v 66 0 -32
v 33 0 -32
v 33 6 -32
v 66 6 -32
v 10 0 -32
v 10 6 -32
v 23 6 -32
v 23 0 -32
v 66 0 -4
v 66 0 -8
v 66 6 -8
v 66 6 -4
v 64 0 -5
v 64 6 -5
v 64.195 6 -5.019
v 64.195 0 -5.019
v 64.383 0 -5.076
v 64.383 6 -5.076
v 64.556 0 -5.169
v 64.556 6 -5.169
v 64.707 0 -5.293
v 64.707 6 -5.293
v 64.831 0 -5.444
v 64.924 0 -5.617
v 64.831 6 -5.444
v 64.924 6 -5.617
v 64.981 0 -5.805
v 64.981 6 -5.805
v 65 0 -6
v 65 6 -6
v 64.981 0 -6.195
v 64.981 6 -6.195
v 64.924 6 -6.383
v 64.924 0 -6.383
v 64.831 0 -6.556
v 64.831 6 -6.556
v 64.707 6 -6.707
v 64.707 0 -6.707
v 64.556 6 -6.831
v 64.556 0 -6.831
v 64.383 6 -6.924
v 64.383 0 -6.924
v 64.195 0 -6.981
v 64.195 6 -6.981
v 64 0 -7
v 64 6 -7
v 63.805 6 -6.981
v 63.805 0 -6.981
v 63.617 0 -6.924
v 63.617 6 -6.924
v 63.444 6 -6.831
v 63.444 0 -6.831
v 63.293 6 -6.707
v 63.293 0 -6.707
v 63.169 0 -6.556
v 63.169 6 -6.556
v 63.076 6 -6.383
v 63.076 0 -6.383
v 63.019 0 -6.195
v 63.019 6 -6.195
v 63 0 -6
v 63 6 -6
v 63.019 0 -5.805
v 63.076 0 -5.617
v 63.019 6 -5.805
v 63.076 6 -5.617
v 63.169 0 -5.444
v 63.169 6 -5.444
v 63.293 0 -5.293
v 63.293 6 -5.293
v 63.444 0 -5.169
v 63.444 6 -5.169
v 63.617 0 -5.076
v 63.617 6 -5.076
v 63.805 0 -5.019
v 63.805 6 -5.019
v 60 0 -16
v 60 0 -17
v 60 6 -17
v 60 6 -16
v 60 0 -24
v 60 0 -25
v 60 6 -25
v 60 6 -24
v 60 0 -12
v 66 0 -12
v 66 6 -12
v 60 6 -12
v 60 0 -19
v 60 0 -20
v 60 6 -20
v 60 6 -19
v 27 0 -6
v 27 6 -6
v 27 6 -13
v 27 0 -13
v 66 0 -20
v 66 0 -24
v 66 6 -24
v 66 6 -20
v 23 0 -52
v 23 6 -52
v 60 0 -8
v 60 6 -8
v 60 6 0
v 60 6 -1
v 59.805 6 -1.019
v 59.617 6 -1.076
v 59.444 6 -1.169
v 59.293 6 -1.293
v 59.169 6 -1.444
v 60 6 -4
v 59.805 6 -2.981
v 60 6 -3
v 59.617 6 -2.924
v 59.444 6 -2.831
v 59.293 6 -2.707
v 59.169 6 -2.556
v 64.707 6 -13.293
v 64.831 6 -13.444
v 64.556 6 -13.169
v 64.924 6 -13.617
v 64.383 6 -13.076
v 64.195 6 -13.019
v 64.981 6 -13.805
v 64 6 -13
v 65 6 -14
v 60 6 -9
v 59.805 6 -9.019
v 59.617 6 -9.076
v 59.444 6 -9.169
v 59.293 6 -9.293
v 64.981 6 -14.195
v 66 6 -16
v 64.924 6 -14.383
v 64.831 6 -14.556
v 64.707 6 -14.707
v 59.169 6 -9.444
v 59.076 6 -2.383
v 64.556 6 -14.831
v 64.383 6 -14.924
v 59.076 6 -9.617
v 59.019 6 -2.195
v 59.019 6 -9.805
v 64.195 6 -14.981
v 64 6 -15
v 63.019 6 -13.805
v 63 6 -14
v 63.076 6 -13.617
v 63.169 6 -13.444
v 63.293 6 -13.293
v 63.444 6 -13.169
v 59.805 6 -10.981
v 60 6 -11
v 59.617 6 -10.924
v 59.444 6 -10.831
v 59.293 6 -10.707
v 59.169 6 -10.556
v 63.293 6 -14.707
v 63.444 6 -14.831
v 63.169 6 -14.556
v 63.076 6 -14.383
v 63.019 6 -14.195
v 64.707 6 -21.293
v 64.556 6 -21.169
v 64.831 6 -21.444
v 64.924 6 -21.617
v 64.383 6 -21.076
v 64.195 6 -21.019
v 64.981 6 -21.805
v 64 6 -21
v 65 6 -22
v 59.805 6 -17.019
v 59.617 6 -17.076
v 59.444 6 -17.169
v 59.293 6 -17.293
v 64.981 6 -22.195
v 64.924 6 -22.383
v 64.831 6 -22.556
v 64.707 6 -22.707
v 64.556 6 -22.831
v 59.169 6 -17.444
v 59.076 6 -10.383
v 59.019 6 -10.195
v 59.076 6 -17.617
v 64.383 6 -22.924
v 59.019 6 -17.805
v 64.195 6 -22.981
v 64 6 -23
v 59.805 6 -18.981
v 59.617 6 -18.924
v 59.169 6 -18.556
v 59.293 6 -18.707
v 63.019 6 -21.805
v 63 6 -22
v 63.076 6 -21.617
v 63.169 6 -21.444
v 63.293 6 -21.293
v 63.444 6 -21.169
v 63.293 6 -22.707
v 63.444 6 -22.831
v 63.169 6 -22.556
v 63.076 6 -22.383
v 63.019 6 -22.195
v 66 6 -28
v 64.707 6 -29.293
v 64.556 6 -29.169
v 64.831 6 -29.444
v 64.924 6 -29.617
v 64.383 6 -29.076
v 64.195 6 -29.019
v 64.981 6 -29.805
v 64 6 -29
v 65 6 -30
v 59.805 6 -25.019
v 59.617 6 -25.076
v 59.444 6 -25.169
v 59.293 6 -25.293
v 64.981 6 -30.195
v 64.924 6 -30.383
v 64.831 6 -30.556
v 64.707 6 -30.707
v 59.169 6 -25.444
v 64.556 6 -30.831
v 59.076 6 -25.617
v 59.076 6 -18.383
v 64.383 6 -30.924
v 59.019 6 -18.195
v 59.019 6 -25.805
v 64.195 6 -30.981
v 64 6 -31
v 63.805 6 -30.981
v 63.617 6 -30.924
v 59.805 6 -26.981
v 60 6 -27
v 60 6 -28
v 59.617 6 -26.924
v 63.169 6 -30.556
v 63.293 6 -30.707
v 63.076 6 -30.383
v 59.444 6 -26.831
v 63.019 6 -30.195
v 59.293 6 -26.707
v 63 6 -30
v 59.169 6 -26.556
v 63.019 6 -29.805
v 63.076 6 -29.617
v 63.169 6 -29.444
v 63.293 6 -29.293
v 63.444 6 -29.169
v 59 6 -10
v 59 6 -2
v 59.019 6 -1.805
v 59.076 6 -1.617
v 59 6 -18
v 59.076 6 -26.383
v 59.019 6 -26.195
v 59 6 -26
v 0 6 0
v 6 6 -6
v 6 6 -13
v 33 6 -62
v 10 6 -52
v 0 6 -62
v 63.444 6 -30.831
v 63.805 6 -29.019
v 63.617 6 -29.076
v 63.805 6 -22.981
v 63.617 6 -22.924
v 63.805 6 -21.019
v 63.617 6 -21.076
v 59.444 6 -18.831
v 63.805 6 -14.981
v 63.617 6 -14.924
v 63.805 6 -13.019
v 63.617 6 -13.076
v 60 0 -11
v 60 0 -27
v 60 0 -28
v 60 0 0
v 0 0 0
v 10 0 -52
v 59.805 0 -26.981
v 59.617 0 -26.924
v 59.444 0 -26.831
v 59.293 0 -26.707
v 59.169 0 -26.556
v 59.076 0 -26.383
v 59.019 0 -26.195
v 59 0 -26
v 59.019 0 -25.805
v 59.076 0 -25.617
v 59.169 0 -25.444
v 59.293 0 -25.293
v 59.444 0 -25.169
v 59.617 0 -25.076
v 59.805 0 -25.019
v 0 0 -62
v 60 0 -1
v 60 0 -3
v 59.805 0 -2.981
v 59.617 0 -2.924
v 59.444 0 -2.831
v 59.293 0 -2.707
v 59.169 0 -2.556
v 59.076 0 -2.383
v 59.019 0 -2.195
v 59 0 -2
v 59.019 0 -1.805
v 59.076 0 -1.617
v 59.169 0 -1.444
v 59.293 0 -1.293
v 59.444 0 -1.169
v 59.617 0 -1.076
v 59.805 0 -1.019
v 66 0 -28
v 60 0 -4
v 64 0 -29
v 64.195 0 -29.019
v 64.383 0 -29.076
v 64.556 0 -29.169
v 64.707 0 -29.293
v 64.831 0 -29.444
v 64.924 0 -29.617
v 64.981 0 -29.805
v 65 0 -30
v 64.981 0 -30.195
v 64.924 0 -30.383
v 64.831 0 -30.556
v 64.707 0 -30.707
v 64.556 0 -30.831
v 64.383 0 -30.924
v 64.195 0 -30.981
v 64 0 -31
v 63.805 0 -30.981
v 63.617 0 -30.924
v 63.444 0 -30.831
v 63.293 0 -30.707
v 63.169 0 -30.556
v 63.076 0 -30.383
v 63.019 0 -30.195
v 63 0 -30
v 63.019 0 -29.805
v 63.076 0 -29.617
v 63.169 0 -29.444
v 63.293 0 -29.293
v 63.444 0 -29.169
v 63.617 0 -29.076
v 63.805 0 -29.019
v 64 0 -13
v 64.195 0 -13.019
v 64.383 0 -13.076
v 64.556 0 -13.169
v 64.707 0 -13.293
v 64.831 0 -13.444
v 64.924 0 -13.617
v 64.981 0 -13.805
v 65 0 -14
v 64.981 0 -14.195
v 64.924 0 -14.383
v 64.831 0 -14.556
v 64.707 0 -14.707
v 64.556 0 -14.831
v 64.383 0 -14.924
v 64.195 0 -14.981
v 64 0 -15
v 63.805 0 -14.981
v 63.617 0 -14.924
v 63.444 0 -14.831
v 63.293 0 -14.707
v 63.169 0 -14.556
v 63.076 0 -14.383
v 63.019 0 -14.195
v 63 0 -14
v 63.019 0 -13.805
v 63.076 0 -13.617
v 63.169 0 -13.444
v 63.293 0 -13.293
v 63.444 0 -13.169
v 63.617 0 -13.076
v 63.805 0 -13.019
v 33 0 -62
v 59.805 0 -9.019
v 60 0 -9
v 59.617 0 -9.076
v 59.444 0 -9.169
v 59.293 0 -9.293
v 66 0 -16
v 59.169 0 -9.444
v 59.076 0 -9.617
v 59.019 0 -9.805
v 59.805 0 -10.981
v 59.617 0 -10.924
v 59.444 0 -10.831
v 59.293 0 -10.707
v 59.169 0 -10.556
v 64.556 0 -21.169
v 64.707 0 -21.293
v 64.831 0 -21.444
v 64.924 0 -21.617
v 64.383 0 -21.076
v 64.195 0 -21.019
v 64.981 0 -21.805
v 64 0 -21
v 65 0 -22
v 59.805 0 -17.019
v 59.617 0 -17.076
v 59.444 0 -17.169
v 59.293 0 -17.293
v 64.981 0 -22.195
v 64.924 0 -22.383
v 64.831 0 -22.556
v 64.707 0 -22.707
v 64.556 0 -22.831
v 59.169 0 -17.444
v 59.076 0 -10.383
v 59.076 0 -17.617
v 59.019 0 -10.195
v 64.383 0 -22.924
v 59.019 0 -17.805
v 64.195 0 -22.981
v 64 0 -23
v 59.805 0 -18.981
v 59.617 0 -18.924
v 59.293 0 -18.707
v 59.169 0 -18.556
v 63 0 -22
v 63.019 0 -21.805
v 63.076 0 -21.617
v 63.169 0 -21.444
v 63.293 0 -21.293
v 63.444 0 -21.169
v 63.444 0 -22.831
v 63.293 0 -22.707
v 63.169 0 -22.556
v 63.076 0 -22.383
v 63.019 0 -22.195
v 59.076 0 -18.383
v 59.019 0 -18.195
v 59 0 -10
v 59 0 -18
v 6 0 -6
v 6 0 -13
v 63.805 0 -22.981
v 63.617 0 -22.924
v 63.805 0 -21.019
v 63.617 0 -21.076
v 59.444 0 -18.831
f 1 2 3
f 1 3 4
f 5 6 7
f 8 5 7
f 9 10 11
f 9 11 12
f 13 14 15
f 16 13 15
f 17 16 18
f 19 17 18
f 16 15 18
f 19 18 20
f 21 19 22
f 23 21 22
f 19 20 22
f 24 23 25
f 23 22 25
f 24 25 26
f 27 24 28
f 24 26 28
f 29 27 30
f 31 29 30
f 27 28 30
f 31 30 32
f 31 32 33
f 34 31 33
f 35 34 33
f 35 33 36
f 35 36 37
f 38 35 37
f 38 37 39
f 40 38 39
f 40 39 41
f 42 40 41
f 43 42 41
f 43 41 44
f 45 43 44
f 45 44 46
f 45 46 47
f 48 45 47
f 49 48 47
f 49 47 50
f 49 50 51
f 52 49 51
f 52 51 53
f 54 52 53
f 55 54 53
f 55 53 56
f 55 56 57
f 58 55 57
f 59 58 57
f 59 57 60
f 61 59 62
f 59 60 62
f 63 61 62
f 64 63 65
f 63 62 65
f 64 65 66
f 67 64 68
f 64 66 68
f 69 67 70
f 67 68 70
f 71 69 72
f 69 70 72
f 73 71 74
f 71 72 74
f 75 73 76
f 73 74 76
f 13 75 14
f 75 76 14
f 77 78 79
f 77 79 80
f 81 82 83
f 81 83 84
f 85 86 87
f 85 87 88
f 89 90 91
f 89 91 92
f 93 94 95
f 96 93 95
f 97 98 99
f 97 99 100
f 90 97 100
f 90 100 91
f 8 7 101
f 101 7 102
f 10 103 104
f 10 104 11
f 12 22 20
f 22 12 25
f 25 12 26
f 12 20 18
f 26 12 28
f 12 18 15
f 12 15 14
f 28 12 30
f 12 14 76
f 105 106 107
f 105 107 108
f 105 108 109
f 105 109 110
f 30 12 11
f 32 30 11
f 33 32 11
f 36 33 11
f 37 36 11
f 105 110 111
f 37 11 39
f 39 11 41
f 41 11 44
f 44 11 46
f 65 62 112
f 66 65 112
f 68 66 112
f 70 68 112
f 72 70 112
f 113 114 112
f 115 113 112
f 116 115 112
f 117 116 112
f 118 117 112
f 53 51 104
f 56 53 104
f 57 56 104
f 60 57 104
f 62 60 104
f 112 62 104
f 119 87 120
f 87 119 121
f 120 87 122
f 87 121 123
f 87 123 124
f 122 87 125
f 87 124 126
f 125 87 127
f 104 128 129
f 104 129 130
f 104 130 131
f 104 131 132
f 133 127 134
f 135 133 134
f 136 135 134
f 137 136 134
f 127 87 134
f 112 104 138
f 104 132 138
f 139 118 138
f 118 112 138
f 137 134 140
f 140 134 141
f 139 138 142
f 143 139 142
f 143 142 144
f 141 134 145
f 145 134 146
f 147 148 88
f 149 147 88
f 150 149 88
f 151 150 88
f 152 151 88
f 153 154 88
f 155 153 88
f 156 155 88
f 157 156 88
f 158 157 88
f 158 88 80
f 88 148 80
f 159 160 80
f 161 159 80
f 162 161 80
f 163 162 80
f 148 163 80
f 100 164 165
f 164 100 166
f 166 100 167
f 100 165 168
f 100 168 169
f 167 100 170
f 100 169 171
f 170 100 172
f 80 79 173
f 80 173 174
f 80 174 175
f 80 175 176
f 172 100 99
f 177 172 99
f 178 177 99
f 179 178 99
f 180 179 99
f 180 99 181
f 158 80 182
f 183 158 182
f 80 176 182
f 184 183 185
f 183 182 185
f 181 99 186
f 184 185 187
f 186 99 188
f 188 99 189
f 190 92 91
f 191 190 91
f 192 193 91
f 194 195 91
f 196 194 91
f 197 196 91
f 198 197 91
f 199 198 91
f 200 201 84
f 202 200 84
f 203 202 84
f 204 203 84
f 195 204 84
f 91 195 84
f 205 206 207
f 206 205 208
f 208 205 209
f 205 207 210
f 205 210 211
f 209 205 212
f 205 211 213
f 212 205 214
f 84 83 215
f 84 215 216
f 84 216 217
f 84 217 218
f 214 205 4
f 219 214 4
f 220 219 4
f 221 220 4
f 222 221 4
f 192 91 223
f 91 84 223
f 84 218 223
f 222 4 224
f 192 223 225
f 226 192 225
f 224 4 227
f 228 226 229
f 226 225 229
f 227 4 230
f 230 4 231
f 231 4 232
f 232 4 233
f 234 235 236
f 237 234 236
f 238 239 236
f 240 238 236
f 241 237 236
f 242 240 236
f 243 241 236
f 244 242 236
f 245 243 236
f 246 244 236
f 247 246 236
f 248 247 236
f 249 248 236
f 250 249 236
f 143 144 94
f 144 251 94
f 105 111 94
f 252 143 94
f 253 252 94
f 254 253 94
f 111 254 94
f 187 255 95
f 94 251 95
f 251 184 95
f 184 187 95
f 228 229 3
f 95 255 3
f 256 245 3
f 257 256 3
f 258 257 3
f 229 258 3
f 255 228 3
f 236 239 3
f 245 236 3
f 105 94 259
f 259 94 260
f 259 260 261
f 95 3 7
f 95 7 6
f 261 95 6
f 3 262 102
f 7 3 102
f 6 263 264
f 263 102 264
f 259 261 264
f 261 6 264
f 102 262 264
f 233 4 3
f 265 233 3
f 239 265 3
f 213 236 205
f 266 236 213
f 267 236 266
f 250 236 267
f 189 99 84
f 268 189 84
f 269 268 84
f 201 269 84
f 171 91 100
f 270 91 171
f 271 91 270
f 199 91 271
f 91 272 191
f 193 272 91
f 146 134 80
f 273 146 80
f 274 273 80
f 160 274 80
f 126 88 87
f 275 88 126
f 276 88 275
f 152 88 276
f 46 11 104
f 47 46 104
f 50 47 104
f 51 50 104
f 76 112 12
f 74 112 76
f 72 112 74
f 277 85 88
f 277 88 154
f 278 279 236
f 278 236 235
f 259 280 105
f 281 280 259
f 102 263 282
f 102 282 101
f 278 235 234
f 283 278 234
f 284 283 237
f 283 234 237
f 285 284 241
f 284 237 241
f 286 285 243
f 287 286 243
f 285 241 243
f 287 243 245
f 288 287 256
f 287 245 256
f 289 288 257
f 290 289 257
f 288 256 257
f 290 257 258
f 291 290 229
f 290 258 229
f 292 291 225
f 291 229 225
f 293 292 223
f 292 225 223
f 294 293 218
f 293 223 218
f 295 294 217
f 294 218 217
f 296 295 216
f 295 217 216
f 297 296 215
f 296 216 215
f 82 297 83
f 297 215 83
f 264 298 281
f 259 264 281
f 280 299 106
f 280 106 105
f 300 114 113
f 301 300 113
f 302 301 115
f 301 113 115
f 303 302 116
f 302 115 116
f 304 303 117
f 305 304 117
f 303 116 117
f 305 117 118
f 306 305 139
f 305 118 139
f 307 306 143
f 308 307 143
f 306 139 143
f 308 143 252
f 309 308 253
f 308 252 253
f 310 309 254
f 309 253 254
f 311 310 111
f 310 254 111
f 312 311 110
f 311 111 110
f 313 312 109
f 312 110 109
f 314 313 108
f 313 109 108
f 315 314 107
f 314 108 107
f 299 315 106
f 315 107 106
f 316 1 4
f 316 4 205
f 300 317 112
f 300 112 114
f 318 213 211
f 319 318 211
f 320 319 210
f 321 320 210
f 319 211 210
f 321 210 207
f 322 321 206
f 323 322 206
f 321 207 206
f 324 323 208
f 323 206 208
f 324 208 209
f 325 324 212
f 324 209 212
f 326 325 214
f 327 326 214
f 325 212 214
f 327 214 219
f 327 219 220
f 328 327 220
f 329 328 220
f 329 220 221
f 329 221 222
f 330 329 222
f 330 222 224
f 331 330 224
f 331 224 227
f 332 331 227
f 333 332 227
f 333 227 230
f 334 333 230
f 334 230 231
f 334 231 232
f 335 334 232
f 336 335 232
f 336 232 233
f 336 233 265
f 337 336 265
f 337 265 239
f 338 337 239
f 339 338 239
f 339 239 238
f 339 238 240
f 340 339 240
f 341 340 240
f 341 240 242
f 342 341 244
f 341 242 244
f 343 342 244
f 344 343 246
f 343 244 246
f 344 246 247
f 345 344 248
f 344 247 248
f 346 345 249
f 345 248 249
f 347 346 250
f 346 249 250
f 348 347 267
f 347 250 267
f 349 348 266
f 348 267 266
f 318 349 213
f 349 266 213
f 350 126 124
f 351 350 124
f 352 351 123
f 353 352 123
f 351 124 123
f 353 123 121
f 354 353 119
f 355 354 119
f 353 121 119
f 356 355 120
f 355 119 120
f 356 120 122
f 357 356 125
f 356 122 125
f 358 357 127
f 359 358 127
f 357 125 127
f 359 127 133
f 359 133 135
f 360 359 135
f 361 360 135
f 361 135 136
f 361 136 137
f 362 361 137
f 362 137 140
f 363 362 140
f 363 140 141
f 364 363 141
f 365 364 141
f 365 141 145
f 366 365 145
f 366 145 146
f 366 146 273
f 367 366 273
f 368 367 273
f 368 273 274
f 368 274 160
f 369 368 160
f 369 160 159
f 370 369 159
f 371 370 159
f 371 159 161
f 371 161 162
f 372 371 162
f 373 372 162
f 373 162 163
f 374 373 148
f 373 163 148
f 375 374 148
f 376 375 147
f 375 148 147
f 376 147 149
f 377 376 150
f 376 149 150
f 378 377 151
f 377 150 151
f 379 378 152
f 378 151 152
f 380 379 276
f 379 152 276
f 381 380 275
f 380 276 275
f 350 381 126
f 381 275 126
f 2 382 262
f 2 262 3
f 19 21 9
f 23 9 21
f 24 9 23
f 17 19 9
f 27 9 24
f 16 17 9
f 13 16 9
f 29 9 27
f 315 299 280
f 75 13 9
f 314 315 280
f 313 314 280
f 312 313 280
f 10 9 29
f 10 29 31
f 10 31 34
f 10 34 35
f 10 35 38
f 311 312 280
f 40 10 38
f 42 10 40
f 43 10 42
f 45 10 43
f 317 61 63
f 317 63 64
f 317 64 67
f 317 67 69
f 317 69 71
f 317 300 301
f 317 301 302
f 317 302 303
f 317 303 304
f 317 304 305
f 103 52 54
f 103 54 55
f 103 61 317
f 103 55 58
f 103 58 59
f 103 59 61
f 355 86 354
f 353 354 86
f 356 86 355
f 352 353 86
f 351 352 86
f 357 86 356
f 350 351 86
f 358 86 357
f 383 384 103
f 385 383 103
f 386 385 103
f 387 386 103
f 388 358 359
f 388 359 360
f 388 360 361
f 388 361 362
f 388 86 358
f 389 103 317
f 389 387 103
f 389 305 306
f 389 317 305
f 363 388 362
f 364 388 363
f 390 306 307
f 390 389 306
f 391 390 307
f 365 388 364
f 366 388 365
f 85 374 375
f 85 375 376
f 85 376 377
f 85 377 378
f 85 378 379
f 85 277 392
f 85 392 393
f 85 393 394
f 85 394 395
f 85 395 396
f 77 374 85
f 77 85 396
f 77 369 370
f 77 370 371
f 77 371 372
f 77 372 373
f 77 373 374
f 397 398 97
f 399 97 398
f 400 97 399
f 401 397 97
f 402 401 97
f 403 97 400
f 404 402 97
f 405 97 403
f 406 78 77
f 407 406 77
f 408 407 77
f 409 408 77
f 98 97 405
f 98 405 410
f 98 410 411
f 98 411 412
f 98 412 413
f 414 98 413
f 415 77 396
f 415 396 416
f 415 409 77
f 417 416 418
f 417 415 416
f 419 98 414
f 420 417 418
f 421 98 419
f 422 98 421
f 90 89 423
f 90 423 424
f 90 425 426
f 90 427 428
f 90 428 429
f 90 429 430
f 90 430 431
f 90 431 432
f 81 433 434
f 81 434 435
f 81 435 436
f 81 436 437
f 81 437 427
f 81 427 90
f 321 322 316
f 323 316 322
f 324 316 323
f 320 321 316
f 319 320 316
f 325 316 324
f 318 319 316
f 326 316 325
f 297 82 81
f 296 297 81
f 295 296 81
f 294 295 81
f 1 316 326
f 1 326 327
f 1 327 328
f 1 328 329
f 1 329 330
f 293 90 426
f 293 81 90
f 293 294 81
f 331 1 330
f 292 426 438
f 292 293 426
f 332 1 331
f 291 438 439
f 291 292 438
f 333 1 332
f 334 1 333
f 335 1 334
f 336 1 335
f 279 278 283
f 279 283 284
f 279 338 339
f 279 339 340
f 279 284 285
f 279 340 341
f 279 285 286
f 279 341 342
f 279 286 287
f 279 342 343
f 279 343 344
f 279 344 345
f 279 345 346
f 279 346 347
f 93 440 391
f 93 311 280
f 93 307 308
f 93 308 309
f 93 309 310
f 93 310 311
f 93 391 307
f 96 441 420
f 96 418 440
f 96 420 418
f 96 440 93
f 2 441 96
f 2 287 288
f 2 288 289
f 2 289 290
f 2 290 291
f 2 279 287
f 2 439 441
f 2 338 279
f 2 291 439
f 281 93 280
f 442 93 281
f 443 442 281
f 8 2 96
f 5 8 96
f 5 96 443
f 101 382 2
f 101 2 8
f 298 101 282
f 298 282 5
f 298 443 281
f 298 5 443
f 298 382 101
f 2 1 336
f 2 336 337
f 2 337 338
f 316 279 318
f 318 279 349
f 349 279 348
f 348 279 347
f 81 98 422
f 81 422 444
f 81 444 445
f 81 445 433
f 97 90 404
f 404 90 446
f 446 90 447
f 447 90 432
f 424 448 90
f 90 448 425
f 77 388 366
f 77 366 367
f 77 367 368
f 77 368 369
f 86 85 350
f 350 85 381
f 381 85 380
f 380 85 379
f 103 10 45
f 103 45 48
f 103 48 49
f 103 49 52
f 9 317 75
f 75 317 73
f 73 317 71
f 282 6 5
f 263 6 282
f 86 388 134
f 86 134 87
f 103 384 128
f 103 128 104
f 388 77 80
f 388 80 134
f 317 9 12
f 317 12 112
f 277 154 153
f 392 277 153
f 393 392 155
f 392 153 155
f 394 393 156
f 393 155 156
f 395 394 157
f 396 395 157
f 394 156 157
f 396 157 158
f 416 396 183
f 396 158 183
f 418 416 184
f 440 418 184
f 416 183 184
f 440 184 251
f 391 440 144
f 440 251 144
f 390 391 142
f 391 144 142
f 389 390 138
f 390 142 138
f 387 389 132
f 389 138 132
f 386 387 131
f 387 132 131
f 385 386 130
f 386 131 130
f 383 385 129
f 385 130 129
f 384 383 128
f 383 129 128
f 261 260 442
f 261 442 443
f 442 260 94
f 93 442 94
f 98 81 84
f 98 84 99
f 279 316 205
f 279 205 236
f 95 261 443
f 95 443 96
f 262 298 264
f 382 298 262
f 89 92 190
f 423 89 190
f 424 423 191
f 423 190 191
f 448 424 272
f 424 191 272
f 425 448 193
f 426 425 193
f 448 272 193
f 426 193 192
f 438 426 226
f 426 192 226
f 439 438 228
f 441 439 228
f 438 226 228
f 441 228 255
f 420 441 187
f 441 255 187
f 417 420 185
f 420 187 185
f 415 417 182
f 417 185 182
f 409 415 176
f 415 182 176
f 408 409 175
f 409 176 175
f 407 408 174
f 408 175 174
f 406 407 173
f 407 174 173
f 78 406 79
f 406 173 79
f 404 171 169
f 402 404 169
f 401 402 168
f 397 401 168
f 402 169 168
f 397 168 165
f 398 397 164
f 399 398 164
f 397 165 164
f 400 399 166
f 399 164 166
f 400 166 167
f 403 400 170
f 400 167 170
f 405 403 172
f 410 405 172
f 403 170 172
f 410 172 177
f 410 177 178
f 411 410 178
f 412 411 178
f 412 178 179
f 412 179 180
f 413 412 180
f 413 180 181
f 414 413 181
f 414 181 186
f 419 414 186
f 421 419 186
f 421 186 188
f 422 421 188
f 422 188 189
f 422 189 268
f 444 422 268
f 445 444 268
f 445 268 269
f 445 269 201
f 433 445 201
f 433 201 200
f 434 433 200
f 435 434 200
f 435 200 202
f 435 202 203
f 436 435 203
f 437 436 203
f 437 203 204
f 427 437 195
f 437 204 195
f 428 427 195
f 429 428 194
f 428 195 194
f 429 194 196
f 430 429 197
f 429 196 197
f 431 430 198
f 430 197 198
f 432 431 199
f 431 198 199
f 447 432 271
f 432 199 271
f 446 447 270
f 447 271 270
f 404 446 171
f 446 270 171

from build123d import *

# Parameters (mm, degrees)
BOSS_EXTRUDE1_DEPTH = 6
SKETCH2_W           = 21
SKETCH2_H           = 7
SKETCH2_W_2         = 13
SKETCH2_H_2         = 20
CUT_EXTRUDE1_DEPTH  = 91.752410436
SKETCH3_R           = 1
CUT_EXTRUDE2_DEPTH  = 91.752410436


with BuildPart() as part:
    # Sketch1 → Boss-Extrude1 (new body)
    with BuildSketch(Plane(origin=(0, 0, 0), x_dir=(1, 0, 0), z_dir=(0, 1, 0))):
        Polygon((33, 32), (66, 32), (66, 28), (60, 28), (60, 24), (66, 24), (66, 20), (60, 20), (60, 16), (66, 16), (66, 12), (60, 12), (60, 8), (66, 8), (66, 4), (60, 4), (60, 0), (0, 0), (0, 20), (0, 62), (33, 62), align=None)
    extrude(amount=BOSS_EXTRUDE1_DEPTH)

    # Sketch2 → Cut-Extrude1 (cut, through all)
    with BuildSketch(Plane(origin=(0, 6, 0), x_dir=(1, 0, 0), z_dir=(0, 1, 0))):
        with Locations((16.5, 9.5)):
            Rectangle(SKETCH2_W, SKETCH2_H)
        with Locations((16.5, 42)):
            Rectangle(SKETCH2_W_2, SKETCH2_H_2)
    extrude(amount=-CUT_EXTRUDE1_DEPTH, mode=Mode.SUBTRACT)

    # Sketch3 → Cut-Extrude2 (cut, through all)
    with BuildSketch(Plane(origin=(0, 6, 0), x_dir=(1, 0, 0), z_dir=(0, 1, 0))):
        with Locations(Location((64, 30, 0), (0, 0, 270))):
            Circle(SKETCH3_R)
        with Locations(Location((64, 22, 0), (0, 0, 270))):
            Circle(SKETCH3_R)
        with Locations(Location((64, 14, 0), (0, 0, 270))):
            Circle(SKETCH3_R)
        with Locations(Location((64, 6, 0), (0, 0, 270))):
            Circle(SKETCH3_R)
        with Locations((60, 26)):
            Circle(SKETCH3_R)
        with Locations((60, 18)):
            Circle(SKETCH3_R)
        with Locations((60, 10)):
            Circle(SKETCH3_R)
        with Locations((60, 2)):
            Circle(SKETCH3_R)
    extrude(amount=-CUT_EXTRUDE2_DEPTH, mode=Mode.SUBTRACT)


solid = part.part
